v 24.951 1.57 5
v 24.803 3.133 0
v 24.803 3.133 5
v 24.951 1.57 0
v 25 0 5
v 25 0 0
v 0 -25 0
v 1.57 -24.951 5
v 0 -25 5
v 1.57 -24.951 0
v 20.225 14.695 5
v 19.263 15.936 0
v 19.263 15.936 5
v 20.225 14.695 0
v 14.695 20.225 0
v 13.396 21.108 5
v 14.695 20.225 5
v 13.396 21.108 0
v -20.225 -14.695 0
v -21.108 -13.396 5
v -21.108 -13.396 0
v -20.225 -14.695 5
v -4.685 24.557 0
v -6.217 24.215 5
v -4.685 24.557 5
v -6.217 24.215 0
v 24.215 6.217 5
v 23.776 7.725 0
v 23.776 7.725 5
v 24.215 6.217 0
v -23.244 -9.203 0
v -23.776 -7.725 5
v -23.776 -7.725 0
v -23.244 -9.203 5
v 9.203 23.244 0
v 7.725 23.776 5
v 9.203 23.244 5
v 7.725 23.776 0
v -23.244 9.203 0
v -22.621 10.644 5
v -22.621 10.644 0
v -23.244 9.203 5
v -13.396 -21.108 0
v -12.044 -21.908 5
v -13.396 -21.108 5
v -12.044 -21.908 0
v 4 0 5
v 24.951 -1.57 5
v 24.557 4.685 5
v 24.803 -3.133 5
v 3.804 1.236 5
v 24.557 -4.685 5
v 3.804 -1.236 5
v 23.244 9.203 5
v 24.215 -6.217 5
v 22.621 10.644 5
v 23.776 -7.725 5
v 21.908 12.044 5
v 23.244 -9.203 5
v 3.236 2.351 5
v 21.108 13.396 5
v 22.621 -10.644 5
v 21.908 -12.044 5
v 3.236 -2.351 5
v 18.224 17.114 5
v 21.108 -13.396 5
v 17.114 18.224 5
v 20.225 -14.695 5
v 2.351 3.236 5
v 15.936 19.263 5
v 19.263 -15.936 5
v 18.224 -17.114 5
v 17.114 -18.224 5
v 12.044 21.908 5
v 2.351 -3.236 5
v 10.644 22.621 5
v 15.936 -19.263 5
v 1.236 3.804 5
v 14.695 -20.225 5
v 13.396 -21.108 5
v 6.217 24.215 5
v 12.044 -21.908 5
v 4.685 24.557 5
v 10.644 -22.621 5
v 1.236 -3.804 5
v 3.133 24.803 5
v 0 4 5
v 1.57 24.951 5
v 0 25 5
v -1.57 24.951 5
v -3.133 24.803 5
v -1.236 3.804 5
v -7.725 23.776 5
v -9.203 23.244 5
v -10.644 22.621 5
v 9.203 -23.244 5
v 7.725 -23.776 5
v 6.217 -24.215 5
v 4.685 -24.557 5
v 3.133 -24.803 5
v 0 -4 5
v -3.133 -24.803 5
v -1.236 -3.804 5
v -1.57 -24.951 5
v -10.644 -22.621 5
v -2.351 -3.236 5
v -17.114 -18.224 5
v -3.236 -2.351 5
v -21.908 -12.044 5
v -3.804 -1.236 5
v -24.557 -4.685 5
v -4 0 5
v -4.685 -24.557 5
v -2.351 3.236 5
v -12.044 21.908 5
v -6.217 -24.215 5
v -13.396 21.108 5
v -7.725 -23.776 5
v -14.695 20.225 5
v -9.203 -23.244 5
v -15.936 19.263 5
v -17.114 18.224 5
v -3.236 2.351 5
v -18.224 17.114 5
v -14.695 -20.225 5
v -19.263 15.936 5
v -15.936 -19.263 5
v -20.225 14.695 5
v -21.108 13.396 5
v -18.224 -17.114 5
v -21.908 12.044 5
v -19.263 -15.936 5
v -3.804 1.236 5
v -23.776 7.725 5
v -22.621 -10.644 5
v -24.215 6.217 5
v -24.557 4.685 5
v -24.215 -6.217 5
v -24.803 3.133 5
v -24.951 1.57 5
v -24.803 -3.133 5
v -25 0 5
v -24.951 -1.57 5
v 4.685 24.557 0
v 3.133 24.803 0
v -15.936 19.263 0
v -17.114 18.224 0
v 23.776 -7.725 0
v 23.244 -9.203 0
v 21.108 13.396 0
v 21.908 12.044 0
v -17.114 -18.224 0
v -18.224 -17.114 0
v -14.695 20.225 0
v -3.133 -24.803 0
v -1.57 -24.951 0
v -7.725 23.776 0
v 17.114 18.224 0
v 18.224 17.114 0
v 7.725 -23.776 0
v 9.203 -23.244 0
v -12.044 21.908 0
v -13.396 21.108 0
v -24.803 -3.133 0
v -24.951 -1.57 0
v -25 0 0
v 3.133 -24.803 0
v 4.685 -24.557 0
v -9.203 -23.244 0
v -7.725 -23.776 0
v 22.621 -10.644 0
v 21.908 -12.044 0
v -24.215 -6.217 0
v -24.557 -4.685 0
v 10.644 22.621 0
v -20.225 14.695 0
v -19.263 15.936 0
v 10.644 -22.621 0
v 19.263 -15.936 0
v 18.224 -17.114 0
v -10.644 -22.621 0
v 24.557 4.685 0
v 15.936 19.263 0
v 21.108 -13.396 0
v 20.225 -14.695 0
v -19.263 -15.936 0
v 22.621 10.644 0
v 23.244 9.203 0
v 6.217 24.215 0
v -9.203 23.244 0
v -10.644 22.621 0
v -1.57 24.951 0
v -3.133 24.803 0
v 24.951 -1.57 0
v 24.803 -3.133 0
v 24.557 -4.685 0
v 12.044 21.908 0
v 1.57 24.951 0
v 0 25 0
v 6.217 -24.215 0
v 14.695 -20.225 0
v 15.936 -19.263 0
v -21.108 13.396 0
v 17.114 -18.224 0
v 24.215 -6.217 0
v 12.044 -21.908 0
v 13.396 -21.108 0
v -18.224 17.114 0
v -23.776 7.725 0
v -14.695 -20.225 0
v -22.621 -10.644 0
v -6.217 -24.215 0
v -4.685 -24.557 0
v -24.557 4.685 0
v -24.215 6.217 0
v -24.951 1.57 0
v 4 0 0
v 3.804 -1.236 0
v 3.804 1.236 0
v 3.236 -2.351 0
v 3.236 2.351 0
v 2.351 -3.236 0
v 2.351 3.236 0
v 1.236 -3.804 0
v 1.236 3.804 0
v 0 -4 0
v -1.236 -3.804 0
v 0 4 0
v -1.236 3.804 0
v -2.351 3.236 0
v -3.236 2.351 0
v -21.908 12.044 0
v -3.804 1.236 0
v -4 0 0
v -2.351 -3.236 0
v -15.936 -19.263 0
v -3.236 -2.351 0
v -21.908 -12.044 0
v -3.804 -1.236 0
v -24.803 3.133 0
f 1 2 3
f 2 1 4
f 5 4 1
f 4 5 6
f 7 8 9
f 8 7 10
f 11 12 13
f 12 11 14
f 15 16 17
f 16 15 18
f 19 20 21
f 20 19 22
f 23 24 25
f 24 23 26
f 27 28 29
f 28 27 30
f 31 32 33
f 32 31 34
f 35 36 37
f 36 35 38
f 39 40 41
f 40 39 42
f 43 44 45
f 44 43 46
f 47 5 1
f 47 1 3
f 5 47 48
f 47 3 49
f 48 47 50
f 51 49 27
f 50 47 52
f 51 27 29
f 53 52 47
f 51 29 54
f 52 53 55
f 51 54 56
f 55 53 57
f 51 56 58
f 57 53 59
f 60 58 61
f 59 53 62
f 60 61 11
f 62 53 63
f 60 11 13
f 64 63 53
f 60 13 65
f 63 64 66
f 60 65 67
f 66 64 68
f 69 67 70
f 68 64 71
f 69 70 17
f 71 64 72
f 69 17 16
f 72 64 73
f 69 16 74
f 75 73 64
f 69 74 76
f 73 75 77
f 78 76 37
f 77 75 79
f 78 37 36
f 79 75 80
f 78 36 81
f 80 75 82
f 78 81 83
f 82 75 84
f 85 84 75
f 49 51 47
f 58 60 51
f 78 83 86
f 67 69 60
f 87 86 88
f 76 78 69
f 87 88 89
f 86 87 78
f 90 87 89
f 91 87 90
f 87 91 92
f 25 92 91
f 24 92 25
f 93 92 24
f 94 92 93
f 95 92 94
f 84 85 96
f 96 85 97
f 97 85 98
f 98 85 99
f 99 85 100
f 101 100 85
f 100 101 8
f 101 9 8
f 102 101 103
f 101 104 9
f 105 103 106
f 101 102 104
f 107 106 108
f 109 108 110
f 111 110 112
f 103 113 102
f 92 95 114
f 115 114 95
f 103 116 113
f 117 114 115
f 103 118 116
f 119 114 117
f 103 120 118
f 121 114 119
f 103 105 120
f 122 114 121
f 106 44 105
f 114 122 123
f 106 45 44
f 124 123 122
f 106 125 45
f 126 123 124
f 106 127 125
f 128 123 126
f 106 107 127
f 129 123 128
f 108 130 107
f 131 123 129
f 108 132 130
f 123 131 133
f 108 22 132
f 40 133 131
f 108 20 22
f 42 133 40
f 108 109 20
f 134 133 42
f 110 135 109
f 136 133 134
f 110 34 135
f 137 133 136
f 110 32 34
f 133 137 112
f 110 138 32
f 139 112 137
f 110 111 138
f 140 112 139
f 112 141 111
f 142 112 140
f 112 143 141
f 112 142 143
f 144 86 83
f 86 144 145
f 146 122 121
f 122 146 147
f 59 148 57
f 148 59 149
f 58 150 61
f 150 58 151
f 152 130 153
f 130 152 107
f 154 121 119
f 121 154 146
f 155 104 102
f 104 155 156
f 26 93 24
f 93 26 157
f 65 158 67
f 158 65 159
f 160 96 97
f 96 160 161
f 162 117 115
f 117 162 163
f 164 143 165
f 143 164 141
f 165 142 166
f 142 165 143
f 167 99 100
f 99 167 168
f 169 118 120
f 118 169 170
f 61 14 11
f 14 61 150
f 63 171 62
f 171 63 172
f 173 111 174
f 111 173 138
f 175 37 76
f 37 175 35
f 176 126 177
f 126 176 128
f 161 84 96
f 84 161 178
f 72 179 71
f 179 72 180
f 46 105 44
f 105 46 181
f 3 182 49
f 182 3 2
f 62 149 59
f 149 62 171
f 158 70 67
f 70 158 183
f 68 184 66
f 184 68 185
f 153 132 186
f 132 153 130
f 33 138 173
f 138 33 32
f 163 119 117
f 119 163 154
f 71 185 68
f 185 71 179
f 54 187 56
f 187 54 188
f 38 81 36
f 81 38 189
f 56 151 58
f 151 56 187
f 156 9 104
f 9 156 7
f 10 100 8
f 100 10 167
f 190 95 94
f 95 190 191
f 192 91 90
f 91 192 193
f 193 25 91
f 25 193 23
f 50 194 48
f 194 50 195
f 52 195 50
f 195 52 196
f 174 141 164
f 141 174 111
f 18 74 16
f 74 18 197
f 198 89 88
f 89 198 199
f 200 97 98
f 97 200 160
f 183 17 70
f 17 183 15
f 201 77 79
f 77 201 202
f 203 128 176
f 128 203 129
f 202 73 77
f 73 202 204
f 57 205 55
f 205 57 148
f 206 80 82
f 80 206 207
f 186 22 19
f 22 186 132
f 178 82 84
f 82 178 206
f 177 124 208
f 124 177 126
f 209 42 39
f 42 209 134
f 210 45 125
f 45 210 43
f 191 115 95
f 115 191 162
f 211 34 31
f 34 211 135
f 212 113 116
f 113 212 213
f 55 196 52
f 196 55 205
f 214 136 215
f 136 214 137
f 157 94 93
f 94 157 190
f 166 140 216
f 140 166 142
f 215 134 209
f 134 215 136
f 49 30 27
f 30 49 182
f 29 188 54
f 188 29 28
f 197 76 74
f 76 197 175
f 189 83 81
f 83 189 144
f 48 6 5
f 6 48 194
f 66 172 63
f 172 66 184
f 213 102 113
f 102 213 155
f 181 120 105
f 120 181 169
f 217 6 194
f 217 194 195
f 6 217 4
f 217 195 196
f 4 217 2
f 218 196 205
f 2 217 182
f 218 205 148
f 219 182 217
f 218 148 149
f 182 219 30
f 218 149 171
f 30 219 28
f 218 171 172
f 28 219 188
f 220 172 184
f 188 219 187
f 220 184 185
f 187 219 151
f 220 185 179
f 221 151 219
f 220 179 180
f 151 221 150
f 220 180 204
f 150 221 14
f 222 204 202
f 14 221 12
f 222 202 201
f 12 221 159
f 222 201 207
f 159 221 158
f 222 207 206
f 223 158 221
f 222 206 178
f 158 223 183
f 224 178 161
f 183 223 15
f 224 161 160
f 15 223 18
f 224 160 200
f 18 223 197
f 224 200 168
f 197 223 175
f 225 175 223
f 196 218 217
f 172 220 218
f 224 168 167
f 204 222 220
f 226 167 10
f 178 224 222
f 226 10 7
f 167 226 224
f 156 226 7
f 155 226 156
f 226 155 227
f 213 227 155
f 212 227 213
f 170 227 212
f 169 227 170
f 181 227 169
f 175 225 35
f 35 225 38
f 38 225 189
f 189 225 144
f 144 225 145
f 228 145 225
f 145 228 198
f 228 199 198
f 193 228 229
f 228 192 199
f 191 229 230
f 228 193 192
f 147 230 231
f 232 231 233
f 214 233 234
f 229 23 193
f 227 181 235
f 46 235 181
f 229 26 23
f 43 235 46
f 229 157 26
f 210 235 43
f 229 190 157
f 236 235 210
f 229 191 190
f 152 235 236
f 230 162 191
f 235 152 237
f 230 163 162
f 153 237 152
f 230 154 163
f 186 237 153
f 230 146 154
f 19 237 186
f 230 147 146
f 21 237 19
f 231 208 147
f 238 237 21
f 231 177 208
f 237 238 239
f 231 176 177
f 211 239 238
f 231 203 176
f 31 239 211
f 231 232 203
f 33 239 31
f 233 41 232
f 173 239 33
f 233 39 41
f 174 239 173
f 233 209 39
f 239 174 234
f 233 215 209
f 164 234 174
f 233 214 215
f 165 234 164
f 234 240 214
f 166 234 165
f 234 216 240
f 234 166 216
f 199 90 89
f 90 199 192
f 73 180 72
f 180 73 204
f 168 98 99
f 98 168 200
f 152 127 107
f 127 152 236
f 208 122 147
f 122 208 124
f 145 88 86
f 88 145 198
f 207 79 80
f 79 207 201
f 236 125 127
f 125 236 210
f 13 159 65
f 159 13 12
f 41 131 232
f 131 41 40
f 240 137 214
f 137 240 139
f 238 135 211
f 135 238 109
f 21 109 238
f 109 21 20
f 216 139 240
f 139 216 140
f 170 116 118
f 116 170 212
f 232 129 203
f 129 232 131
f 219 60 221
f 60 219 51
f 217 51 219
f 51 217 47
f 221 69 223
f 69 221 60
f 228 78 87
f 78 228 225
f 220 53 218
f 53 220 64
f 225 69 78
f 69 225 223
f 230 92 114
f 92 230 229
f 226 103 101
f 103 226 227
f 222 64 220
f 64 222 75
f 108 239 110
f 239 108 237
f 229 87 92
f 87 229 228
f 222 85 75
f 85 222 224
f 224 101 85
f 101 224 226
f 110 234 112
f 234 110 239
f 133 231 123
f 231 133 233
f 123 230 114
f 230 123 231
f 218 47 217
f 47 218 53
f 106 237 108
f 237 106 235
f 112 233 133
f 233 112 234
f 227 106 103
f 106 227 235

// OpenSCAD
// --Rueda simple
difference(){
    //-- Base de la rueda
    cylinder(r=50/2,h=5,$fn=100);
    
    //-- Taladro de 8mm
    cylinder(r=8/2,h=20,$fn=20,center=true);
}
